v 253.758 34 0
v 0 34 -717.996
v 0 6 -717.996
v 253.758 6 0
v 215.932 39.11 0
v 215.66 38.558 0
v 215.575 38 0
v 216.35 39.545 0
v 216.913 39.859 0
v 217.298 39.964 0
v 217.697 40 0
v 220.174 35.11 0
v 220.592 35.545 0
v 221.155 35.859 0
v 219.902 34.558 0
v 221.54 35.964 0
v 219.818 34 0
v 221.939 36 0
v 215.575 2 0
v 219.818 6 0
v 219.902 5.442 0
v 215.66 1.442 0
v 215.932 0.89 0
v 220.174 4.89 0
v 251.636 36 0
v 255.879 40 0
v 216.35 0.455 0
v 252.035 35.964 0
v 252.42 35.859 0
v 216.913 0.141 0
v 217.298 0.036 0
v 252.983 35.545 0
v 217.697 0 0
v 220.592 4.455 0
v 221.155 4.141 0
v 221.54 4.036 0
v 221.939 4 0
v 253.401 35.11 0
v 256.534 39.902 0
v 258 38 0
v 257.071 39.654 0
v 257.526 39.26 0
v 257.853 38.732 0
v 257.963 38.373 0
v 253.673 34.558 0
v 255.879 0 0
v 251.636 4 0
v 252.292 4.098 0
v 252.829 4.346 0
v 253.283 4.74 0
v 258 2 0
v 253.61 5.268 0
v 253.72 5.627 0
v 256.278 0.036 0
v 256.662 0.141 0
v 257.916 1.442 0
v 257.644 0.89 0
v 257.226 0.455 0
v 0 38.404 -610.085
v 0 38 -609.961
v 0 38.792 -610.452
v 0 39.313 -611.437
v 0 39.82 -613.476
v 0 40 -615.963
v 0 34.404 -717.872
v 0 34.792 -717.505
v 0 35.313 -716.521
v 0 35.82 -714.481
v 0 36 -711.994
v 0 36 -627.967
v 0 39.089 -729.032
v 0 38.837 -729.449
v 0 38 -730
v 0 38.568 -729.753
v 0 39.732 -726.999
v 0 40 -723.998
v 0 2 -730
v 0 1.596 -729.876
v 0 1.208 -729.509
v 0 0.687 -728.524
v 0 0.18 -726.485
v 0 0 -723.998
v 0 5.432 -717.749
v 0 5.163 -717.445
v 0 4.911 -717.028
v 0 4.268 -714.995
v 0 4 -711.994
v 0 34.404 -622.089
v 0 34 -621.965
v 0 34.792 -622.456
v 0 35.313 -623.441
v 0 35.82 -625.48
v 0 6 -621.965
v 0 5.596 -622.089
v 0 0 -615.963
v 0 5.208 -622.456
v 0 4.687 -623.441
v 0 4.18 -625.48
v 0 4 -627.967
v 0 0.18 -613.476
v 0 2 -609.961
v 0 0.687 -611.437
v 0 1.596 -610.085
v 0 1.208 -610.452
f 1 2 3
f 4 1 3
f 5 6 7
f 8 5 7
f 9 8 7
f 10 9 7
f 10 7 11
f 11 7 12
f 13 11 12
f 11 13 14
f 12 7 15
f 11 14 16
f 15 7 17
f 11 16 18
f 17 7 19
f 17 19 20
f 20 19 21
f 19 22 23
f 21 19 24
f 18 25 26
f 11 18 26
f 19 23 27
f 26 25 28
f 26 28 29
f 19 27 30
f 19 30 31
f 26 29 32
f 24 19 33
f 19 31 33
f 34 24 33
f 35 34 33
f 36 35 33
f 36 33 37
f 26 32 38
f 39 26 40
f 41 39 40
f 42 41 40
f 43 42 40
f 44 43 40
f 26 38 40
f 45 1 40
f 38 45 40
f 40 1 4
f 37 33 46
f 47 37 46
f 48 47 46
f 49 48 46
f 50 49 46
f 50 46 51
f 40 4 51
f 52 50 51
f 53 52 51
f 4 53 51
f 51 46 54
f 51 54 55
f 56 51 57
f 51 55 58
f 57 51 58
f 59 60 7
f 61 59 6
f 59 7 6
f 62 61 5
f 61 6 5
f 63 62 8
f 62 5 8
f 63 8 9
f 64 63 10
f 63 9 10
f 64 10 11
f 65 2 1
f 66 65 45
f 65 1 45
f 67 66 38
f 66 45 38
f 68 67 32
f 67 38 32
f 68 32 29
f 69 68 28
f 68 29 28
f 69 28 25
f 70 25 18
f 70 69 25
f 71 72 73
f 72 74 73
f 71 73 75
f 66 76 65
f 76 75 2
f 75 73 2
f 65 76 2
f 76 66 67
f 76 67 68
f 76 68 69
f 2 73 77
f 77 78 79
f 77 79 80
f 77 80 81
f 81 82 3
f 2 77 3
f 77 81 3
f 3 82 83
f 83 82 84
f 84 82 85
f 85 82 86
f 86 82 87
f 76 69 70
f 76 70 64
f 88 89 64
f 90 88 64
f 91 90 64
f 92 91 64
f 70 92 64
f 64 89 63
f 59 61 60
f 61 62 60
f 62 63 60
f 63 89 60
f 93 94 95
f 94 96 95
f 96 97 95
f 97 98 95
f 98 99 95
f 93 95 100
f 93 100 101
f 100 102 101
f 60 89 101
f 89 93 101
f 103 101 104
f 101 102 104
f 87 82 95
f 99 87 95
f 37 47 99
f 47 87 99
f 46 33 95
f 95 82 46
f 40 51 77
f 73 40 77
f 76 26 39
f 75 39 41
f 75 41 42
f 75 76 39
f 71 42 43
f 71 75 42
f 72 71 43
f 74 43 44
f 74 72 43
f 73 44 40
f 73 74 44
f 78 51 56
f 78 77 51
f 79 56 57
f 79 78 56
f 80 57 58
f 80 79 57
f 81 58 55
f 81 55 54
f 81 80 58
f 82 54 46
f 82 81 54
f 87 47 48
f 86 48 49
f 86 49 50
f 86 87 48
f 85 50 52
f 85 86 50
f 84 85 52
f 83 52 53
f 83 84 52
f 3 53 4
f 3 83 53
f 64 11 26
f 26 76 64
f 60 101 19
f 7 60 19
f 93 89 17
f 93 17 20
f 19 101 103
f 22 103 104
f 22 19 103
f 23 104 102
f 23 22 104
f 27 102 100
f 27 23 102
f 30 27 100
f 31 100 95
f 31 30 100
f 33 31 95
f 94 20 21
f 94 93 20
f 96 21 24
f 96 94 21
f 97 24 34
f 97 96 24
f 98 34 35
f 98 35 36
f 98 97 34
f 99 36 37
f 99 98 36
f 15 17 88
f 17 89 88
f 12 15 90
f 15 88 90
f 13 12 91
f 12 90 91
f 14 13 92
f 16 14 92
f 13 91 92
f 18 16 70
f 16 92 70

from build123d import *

# Parameters (mm, degrees)
BOSS_EXTRU_1_DEPTH           = 40
COQUE1_T                     = 4
ENL_V_MAT_EXTRU_1_DEPTH      = 833.320761278
ENL_V_MAT_EXTRU_1_DEPTH_BACK = 833.320761278
ESQUISSE2_W                  = 32
ESQUISSE2_H                  = 32
CONG_1_R                     = 2


with BuildPart() as part:
    # Esquisse1 → Boss.-Extru.1 (new body)
    with BuildSketch(Plane(origin=(0, 0, 0), x_dir=(1, 0, 0), z_dir=(0, 1, 0))):
        Polygon((0, 609.961146446), (215.575309292, 0), (258, 0), (0, 730), align=None)
    extrude(amount=BOSS_EXTRU_1_DEPTH)

    # Coque1 (no face opened: a closed hollow body)
    add(offset(amount=-COQUE1_T, mode=Mode.PRIVATE), mode=Mode.SUBTRACT)

    # Esquisse2 → Enlèv. mat.-Extru.1 (cut, two sides: drawn at the far end of the back side and taken through both)
    with BuildSketch(Plane(origin=(23.937308809, 0, 67.729594691), x_dir=(0, -1, 0), z_dir=(-0.33322544172708785, 0, -0.9428471800805194)).offset(-ENL_V_MAT_EXTRU_1_DEPTH_BACK)):
        with Locations((-20, -223.254572461)):
            Rectangle(ESQUISSE2_W, ESQUISSE2_H)
    extrude(amount=ENL_V_MAT_EXTRU_1_DEPTH + ENL_V_MAT_EXTRU_1_DEPTH_BACK, mode=Mode.SUBTRACT)

    # Congé1
    cong_1_edges = [part.edges().sort_by_distance(p)[0] for p in [
        (129, 40, -365),
        (109.908889181, 4, -310.982515901),
        (126.878765465, 4, -358.998057322),
        (109.908889181, 36, -310.982515901),
        (126.878765465, 36, -358.998057322),
        (129, 0, -365),
        (107.787654646, 0, -304.980573223),
        (107.787654646, 40, -304.980573223),
    ]]
    fillet(cong_1_edges, radius=CONG_1_R)


solid = part.part
